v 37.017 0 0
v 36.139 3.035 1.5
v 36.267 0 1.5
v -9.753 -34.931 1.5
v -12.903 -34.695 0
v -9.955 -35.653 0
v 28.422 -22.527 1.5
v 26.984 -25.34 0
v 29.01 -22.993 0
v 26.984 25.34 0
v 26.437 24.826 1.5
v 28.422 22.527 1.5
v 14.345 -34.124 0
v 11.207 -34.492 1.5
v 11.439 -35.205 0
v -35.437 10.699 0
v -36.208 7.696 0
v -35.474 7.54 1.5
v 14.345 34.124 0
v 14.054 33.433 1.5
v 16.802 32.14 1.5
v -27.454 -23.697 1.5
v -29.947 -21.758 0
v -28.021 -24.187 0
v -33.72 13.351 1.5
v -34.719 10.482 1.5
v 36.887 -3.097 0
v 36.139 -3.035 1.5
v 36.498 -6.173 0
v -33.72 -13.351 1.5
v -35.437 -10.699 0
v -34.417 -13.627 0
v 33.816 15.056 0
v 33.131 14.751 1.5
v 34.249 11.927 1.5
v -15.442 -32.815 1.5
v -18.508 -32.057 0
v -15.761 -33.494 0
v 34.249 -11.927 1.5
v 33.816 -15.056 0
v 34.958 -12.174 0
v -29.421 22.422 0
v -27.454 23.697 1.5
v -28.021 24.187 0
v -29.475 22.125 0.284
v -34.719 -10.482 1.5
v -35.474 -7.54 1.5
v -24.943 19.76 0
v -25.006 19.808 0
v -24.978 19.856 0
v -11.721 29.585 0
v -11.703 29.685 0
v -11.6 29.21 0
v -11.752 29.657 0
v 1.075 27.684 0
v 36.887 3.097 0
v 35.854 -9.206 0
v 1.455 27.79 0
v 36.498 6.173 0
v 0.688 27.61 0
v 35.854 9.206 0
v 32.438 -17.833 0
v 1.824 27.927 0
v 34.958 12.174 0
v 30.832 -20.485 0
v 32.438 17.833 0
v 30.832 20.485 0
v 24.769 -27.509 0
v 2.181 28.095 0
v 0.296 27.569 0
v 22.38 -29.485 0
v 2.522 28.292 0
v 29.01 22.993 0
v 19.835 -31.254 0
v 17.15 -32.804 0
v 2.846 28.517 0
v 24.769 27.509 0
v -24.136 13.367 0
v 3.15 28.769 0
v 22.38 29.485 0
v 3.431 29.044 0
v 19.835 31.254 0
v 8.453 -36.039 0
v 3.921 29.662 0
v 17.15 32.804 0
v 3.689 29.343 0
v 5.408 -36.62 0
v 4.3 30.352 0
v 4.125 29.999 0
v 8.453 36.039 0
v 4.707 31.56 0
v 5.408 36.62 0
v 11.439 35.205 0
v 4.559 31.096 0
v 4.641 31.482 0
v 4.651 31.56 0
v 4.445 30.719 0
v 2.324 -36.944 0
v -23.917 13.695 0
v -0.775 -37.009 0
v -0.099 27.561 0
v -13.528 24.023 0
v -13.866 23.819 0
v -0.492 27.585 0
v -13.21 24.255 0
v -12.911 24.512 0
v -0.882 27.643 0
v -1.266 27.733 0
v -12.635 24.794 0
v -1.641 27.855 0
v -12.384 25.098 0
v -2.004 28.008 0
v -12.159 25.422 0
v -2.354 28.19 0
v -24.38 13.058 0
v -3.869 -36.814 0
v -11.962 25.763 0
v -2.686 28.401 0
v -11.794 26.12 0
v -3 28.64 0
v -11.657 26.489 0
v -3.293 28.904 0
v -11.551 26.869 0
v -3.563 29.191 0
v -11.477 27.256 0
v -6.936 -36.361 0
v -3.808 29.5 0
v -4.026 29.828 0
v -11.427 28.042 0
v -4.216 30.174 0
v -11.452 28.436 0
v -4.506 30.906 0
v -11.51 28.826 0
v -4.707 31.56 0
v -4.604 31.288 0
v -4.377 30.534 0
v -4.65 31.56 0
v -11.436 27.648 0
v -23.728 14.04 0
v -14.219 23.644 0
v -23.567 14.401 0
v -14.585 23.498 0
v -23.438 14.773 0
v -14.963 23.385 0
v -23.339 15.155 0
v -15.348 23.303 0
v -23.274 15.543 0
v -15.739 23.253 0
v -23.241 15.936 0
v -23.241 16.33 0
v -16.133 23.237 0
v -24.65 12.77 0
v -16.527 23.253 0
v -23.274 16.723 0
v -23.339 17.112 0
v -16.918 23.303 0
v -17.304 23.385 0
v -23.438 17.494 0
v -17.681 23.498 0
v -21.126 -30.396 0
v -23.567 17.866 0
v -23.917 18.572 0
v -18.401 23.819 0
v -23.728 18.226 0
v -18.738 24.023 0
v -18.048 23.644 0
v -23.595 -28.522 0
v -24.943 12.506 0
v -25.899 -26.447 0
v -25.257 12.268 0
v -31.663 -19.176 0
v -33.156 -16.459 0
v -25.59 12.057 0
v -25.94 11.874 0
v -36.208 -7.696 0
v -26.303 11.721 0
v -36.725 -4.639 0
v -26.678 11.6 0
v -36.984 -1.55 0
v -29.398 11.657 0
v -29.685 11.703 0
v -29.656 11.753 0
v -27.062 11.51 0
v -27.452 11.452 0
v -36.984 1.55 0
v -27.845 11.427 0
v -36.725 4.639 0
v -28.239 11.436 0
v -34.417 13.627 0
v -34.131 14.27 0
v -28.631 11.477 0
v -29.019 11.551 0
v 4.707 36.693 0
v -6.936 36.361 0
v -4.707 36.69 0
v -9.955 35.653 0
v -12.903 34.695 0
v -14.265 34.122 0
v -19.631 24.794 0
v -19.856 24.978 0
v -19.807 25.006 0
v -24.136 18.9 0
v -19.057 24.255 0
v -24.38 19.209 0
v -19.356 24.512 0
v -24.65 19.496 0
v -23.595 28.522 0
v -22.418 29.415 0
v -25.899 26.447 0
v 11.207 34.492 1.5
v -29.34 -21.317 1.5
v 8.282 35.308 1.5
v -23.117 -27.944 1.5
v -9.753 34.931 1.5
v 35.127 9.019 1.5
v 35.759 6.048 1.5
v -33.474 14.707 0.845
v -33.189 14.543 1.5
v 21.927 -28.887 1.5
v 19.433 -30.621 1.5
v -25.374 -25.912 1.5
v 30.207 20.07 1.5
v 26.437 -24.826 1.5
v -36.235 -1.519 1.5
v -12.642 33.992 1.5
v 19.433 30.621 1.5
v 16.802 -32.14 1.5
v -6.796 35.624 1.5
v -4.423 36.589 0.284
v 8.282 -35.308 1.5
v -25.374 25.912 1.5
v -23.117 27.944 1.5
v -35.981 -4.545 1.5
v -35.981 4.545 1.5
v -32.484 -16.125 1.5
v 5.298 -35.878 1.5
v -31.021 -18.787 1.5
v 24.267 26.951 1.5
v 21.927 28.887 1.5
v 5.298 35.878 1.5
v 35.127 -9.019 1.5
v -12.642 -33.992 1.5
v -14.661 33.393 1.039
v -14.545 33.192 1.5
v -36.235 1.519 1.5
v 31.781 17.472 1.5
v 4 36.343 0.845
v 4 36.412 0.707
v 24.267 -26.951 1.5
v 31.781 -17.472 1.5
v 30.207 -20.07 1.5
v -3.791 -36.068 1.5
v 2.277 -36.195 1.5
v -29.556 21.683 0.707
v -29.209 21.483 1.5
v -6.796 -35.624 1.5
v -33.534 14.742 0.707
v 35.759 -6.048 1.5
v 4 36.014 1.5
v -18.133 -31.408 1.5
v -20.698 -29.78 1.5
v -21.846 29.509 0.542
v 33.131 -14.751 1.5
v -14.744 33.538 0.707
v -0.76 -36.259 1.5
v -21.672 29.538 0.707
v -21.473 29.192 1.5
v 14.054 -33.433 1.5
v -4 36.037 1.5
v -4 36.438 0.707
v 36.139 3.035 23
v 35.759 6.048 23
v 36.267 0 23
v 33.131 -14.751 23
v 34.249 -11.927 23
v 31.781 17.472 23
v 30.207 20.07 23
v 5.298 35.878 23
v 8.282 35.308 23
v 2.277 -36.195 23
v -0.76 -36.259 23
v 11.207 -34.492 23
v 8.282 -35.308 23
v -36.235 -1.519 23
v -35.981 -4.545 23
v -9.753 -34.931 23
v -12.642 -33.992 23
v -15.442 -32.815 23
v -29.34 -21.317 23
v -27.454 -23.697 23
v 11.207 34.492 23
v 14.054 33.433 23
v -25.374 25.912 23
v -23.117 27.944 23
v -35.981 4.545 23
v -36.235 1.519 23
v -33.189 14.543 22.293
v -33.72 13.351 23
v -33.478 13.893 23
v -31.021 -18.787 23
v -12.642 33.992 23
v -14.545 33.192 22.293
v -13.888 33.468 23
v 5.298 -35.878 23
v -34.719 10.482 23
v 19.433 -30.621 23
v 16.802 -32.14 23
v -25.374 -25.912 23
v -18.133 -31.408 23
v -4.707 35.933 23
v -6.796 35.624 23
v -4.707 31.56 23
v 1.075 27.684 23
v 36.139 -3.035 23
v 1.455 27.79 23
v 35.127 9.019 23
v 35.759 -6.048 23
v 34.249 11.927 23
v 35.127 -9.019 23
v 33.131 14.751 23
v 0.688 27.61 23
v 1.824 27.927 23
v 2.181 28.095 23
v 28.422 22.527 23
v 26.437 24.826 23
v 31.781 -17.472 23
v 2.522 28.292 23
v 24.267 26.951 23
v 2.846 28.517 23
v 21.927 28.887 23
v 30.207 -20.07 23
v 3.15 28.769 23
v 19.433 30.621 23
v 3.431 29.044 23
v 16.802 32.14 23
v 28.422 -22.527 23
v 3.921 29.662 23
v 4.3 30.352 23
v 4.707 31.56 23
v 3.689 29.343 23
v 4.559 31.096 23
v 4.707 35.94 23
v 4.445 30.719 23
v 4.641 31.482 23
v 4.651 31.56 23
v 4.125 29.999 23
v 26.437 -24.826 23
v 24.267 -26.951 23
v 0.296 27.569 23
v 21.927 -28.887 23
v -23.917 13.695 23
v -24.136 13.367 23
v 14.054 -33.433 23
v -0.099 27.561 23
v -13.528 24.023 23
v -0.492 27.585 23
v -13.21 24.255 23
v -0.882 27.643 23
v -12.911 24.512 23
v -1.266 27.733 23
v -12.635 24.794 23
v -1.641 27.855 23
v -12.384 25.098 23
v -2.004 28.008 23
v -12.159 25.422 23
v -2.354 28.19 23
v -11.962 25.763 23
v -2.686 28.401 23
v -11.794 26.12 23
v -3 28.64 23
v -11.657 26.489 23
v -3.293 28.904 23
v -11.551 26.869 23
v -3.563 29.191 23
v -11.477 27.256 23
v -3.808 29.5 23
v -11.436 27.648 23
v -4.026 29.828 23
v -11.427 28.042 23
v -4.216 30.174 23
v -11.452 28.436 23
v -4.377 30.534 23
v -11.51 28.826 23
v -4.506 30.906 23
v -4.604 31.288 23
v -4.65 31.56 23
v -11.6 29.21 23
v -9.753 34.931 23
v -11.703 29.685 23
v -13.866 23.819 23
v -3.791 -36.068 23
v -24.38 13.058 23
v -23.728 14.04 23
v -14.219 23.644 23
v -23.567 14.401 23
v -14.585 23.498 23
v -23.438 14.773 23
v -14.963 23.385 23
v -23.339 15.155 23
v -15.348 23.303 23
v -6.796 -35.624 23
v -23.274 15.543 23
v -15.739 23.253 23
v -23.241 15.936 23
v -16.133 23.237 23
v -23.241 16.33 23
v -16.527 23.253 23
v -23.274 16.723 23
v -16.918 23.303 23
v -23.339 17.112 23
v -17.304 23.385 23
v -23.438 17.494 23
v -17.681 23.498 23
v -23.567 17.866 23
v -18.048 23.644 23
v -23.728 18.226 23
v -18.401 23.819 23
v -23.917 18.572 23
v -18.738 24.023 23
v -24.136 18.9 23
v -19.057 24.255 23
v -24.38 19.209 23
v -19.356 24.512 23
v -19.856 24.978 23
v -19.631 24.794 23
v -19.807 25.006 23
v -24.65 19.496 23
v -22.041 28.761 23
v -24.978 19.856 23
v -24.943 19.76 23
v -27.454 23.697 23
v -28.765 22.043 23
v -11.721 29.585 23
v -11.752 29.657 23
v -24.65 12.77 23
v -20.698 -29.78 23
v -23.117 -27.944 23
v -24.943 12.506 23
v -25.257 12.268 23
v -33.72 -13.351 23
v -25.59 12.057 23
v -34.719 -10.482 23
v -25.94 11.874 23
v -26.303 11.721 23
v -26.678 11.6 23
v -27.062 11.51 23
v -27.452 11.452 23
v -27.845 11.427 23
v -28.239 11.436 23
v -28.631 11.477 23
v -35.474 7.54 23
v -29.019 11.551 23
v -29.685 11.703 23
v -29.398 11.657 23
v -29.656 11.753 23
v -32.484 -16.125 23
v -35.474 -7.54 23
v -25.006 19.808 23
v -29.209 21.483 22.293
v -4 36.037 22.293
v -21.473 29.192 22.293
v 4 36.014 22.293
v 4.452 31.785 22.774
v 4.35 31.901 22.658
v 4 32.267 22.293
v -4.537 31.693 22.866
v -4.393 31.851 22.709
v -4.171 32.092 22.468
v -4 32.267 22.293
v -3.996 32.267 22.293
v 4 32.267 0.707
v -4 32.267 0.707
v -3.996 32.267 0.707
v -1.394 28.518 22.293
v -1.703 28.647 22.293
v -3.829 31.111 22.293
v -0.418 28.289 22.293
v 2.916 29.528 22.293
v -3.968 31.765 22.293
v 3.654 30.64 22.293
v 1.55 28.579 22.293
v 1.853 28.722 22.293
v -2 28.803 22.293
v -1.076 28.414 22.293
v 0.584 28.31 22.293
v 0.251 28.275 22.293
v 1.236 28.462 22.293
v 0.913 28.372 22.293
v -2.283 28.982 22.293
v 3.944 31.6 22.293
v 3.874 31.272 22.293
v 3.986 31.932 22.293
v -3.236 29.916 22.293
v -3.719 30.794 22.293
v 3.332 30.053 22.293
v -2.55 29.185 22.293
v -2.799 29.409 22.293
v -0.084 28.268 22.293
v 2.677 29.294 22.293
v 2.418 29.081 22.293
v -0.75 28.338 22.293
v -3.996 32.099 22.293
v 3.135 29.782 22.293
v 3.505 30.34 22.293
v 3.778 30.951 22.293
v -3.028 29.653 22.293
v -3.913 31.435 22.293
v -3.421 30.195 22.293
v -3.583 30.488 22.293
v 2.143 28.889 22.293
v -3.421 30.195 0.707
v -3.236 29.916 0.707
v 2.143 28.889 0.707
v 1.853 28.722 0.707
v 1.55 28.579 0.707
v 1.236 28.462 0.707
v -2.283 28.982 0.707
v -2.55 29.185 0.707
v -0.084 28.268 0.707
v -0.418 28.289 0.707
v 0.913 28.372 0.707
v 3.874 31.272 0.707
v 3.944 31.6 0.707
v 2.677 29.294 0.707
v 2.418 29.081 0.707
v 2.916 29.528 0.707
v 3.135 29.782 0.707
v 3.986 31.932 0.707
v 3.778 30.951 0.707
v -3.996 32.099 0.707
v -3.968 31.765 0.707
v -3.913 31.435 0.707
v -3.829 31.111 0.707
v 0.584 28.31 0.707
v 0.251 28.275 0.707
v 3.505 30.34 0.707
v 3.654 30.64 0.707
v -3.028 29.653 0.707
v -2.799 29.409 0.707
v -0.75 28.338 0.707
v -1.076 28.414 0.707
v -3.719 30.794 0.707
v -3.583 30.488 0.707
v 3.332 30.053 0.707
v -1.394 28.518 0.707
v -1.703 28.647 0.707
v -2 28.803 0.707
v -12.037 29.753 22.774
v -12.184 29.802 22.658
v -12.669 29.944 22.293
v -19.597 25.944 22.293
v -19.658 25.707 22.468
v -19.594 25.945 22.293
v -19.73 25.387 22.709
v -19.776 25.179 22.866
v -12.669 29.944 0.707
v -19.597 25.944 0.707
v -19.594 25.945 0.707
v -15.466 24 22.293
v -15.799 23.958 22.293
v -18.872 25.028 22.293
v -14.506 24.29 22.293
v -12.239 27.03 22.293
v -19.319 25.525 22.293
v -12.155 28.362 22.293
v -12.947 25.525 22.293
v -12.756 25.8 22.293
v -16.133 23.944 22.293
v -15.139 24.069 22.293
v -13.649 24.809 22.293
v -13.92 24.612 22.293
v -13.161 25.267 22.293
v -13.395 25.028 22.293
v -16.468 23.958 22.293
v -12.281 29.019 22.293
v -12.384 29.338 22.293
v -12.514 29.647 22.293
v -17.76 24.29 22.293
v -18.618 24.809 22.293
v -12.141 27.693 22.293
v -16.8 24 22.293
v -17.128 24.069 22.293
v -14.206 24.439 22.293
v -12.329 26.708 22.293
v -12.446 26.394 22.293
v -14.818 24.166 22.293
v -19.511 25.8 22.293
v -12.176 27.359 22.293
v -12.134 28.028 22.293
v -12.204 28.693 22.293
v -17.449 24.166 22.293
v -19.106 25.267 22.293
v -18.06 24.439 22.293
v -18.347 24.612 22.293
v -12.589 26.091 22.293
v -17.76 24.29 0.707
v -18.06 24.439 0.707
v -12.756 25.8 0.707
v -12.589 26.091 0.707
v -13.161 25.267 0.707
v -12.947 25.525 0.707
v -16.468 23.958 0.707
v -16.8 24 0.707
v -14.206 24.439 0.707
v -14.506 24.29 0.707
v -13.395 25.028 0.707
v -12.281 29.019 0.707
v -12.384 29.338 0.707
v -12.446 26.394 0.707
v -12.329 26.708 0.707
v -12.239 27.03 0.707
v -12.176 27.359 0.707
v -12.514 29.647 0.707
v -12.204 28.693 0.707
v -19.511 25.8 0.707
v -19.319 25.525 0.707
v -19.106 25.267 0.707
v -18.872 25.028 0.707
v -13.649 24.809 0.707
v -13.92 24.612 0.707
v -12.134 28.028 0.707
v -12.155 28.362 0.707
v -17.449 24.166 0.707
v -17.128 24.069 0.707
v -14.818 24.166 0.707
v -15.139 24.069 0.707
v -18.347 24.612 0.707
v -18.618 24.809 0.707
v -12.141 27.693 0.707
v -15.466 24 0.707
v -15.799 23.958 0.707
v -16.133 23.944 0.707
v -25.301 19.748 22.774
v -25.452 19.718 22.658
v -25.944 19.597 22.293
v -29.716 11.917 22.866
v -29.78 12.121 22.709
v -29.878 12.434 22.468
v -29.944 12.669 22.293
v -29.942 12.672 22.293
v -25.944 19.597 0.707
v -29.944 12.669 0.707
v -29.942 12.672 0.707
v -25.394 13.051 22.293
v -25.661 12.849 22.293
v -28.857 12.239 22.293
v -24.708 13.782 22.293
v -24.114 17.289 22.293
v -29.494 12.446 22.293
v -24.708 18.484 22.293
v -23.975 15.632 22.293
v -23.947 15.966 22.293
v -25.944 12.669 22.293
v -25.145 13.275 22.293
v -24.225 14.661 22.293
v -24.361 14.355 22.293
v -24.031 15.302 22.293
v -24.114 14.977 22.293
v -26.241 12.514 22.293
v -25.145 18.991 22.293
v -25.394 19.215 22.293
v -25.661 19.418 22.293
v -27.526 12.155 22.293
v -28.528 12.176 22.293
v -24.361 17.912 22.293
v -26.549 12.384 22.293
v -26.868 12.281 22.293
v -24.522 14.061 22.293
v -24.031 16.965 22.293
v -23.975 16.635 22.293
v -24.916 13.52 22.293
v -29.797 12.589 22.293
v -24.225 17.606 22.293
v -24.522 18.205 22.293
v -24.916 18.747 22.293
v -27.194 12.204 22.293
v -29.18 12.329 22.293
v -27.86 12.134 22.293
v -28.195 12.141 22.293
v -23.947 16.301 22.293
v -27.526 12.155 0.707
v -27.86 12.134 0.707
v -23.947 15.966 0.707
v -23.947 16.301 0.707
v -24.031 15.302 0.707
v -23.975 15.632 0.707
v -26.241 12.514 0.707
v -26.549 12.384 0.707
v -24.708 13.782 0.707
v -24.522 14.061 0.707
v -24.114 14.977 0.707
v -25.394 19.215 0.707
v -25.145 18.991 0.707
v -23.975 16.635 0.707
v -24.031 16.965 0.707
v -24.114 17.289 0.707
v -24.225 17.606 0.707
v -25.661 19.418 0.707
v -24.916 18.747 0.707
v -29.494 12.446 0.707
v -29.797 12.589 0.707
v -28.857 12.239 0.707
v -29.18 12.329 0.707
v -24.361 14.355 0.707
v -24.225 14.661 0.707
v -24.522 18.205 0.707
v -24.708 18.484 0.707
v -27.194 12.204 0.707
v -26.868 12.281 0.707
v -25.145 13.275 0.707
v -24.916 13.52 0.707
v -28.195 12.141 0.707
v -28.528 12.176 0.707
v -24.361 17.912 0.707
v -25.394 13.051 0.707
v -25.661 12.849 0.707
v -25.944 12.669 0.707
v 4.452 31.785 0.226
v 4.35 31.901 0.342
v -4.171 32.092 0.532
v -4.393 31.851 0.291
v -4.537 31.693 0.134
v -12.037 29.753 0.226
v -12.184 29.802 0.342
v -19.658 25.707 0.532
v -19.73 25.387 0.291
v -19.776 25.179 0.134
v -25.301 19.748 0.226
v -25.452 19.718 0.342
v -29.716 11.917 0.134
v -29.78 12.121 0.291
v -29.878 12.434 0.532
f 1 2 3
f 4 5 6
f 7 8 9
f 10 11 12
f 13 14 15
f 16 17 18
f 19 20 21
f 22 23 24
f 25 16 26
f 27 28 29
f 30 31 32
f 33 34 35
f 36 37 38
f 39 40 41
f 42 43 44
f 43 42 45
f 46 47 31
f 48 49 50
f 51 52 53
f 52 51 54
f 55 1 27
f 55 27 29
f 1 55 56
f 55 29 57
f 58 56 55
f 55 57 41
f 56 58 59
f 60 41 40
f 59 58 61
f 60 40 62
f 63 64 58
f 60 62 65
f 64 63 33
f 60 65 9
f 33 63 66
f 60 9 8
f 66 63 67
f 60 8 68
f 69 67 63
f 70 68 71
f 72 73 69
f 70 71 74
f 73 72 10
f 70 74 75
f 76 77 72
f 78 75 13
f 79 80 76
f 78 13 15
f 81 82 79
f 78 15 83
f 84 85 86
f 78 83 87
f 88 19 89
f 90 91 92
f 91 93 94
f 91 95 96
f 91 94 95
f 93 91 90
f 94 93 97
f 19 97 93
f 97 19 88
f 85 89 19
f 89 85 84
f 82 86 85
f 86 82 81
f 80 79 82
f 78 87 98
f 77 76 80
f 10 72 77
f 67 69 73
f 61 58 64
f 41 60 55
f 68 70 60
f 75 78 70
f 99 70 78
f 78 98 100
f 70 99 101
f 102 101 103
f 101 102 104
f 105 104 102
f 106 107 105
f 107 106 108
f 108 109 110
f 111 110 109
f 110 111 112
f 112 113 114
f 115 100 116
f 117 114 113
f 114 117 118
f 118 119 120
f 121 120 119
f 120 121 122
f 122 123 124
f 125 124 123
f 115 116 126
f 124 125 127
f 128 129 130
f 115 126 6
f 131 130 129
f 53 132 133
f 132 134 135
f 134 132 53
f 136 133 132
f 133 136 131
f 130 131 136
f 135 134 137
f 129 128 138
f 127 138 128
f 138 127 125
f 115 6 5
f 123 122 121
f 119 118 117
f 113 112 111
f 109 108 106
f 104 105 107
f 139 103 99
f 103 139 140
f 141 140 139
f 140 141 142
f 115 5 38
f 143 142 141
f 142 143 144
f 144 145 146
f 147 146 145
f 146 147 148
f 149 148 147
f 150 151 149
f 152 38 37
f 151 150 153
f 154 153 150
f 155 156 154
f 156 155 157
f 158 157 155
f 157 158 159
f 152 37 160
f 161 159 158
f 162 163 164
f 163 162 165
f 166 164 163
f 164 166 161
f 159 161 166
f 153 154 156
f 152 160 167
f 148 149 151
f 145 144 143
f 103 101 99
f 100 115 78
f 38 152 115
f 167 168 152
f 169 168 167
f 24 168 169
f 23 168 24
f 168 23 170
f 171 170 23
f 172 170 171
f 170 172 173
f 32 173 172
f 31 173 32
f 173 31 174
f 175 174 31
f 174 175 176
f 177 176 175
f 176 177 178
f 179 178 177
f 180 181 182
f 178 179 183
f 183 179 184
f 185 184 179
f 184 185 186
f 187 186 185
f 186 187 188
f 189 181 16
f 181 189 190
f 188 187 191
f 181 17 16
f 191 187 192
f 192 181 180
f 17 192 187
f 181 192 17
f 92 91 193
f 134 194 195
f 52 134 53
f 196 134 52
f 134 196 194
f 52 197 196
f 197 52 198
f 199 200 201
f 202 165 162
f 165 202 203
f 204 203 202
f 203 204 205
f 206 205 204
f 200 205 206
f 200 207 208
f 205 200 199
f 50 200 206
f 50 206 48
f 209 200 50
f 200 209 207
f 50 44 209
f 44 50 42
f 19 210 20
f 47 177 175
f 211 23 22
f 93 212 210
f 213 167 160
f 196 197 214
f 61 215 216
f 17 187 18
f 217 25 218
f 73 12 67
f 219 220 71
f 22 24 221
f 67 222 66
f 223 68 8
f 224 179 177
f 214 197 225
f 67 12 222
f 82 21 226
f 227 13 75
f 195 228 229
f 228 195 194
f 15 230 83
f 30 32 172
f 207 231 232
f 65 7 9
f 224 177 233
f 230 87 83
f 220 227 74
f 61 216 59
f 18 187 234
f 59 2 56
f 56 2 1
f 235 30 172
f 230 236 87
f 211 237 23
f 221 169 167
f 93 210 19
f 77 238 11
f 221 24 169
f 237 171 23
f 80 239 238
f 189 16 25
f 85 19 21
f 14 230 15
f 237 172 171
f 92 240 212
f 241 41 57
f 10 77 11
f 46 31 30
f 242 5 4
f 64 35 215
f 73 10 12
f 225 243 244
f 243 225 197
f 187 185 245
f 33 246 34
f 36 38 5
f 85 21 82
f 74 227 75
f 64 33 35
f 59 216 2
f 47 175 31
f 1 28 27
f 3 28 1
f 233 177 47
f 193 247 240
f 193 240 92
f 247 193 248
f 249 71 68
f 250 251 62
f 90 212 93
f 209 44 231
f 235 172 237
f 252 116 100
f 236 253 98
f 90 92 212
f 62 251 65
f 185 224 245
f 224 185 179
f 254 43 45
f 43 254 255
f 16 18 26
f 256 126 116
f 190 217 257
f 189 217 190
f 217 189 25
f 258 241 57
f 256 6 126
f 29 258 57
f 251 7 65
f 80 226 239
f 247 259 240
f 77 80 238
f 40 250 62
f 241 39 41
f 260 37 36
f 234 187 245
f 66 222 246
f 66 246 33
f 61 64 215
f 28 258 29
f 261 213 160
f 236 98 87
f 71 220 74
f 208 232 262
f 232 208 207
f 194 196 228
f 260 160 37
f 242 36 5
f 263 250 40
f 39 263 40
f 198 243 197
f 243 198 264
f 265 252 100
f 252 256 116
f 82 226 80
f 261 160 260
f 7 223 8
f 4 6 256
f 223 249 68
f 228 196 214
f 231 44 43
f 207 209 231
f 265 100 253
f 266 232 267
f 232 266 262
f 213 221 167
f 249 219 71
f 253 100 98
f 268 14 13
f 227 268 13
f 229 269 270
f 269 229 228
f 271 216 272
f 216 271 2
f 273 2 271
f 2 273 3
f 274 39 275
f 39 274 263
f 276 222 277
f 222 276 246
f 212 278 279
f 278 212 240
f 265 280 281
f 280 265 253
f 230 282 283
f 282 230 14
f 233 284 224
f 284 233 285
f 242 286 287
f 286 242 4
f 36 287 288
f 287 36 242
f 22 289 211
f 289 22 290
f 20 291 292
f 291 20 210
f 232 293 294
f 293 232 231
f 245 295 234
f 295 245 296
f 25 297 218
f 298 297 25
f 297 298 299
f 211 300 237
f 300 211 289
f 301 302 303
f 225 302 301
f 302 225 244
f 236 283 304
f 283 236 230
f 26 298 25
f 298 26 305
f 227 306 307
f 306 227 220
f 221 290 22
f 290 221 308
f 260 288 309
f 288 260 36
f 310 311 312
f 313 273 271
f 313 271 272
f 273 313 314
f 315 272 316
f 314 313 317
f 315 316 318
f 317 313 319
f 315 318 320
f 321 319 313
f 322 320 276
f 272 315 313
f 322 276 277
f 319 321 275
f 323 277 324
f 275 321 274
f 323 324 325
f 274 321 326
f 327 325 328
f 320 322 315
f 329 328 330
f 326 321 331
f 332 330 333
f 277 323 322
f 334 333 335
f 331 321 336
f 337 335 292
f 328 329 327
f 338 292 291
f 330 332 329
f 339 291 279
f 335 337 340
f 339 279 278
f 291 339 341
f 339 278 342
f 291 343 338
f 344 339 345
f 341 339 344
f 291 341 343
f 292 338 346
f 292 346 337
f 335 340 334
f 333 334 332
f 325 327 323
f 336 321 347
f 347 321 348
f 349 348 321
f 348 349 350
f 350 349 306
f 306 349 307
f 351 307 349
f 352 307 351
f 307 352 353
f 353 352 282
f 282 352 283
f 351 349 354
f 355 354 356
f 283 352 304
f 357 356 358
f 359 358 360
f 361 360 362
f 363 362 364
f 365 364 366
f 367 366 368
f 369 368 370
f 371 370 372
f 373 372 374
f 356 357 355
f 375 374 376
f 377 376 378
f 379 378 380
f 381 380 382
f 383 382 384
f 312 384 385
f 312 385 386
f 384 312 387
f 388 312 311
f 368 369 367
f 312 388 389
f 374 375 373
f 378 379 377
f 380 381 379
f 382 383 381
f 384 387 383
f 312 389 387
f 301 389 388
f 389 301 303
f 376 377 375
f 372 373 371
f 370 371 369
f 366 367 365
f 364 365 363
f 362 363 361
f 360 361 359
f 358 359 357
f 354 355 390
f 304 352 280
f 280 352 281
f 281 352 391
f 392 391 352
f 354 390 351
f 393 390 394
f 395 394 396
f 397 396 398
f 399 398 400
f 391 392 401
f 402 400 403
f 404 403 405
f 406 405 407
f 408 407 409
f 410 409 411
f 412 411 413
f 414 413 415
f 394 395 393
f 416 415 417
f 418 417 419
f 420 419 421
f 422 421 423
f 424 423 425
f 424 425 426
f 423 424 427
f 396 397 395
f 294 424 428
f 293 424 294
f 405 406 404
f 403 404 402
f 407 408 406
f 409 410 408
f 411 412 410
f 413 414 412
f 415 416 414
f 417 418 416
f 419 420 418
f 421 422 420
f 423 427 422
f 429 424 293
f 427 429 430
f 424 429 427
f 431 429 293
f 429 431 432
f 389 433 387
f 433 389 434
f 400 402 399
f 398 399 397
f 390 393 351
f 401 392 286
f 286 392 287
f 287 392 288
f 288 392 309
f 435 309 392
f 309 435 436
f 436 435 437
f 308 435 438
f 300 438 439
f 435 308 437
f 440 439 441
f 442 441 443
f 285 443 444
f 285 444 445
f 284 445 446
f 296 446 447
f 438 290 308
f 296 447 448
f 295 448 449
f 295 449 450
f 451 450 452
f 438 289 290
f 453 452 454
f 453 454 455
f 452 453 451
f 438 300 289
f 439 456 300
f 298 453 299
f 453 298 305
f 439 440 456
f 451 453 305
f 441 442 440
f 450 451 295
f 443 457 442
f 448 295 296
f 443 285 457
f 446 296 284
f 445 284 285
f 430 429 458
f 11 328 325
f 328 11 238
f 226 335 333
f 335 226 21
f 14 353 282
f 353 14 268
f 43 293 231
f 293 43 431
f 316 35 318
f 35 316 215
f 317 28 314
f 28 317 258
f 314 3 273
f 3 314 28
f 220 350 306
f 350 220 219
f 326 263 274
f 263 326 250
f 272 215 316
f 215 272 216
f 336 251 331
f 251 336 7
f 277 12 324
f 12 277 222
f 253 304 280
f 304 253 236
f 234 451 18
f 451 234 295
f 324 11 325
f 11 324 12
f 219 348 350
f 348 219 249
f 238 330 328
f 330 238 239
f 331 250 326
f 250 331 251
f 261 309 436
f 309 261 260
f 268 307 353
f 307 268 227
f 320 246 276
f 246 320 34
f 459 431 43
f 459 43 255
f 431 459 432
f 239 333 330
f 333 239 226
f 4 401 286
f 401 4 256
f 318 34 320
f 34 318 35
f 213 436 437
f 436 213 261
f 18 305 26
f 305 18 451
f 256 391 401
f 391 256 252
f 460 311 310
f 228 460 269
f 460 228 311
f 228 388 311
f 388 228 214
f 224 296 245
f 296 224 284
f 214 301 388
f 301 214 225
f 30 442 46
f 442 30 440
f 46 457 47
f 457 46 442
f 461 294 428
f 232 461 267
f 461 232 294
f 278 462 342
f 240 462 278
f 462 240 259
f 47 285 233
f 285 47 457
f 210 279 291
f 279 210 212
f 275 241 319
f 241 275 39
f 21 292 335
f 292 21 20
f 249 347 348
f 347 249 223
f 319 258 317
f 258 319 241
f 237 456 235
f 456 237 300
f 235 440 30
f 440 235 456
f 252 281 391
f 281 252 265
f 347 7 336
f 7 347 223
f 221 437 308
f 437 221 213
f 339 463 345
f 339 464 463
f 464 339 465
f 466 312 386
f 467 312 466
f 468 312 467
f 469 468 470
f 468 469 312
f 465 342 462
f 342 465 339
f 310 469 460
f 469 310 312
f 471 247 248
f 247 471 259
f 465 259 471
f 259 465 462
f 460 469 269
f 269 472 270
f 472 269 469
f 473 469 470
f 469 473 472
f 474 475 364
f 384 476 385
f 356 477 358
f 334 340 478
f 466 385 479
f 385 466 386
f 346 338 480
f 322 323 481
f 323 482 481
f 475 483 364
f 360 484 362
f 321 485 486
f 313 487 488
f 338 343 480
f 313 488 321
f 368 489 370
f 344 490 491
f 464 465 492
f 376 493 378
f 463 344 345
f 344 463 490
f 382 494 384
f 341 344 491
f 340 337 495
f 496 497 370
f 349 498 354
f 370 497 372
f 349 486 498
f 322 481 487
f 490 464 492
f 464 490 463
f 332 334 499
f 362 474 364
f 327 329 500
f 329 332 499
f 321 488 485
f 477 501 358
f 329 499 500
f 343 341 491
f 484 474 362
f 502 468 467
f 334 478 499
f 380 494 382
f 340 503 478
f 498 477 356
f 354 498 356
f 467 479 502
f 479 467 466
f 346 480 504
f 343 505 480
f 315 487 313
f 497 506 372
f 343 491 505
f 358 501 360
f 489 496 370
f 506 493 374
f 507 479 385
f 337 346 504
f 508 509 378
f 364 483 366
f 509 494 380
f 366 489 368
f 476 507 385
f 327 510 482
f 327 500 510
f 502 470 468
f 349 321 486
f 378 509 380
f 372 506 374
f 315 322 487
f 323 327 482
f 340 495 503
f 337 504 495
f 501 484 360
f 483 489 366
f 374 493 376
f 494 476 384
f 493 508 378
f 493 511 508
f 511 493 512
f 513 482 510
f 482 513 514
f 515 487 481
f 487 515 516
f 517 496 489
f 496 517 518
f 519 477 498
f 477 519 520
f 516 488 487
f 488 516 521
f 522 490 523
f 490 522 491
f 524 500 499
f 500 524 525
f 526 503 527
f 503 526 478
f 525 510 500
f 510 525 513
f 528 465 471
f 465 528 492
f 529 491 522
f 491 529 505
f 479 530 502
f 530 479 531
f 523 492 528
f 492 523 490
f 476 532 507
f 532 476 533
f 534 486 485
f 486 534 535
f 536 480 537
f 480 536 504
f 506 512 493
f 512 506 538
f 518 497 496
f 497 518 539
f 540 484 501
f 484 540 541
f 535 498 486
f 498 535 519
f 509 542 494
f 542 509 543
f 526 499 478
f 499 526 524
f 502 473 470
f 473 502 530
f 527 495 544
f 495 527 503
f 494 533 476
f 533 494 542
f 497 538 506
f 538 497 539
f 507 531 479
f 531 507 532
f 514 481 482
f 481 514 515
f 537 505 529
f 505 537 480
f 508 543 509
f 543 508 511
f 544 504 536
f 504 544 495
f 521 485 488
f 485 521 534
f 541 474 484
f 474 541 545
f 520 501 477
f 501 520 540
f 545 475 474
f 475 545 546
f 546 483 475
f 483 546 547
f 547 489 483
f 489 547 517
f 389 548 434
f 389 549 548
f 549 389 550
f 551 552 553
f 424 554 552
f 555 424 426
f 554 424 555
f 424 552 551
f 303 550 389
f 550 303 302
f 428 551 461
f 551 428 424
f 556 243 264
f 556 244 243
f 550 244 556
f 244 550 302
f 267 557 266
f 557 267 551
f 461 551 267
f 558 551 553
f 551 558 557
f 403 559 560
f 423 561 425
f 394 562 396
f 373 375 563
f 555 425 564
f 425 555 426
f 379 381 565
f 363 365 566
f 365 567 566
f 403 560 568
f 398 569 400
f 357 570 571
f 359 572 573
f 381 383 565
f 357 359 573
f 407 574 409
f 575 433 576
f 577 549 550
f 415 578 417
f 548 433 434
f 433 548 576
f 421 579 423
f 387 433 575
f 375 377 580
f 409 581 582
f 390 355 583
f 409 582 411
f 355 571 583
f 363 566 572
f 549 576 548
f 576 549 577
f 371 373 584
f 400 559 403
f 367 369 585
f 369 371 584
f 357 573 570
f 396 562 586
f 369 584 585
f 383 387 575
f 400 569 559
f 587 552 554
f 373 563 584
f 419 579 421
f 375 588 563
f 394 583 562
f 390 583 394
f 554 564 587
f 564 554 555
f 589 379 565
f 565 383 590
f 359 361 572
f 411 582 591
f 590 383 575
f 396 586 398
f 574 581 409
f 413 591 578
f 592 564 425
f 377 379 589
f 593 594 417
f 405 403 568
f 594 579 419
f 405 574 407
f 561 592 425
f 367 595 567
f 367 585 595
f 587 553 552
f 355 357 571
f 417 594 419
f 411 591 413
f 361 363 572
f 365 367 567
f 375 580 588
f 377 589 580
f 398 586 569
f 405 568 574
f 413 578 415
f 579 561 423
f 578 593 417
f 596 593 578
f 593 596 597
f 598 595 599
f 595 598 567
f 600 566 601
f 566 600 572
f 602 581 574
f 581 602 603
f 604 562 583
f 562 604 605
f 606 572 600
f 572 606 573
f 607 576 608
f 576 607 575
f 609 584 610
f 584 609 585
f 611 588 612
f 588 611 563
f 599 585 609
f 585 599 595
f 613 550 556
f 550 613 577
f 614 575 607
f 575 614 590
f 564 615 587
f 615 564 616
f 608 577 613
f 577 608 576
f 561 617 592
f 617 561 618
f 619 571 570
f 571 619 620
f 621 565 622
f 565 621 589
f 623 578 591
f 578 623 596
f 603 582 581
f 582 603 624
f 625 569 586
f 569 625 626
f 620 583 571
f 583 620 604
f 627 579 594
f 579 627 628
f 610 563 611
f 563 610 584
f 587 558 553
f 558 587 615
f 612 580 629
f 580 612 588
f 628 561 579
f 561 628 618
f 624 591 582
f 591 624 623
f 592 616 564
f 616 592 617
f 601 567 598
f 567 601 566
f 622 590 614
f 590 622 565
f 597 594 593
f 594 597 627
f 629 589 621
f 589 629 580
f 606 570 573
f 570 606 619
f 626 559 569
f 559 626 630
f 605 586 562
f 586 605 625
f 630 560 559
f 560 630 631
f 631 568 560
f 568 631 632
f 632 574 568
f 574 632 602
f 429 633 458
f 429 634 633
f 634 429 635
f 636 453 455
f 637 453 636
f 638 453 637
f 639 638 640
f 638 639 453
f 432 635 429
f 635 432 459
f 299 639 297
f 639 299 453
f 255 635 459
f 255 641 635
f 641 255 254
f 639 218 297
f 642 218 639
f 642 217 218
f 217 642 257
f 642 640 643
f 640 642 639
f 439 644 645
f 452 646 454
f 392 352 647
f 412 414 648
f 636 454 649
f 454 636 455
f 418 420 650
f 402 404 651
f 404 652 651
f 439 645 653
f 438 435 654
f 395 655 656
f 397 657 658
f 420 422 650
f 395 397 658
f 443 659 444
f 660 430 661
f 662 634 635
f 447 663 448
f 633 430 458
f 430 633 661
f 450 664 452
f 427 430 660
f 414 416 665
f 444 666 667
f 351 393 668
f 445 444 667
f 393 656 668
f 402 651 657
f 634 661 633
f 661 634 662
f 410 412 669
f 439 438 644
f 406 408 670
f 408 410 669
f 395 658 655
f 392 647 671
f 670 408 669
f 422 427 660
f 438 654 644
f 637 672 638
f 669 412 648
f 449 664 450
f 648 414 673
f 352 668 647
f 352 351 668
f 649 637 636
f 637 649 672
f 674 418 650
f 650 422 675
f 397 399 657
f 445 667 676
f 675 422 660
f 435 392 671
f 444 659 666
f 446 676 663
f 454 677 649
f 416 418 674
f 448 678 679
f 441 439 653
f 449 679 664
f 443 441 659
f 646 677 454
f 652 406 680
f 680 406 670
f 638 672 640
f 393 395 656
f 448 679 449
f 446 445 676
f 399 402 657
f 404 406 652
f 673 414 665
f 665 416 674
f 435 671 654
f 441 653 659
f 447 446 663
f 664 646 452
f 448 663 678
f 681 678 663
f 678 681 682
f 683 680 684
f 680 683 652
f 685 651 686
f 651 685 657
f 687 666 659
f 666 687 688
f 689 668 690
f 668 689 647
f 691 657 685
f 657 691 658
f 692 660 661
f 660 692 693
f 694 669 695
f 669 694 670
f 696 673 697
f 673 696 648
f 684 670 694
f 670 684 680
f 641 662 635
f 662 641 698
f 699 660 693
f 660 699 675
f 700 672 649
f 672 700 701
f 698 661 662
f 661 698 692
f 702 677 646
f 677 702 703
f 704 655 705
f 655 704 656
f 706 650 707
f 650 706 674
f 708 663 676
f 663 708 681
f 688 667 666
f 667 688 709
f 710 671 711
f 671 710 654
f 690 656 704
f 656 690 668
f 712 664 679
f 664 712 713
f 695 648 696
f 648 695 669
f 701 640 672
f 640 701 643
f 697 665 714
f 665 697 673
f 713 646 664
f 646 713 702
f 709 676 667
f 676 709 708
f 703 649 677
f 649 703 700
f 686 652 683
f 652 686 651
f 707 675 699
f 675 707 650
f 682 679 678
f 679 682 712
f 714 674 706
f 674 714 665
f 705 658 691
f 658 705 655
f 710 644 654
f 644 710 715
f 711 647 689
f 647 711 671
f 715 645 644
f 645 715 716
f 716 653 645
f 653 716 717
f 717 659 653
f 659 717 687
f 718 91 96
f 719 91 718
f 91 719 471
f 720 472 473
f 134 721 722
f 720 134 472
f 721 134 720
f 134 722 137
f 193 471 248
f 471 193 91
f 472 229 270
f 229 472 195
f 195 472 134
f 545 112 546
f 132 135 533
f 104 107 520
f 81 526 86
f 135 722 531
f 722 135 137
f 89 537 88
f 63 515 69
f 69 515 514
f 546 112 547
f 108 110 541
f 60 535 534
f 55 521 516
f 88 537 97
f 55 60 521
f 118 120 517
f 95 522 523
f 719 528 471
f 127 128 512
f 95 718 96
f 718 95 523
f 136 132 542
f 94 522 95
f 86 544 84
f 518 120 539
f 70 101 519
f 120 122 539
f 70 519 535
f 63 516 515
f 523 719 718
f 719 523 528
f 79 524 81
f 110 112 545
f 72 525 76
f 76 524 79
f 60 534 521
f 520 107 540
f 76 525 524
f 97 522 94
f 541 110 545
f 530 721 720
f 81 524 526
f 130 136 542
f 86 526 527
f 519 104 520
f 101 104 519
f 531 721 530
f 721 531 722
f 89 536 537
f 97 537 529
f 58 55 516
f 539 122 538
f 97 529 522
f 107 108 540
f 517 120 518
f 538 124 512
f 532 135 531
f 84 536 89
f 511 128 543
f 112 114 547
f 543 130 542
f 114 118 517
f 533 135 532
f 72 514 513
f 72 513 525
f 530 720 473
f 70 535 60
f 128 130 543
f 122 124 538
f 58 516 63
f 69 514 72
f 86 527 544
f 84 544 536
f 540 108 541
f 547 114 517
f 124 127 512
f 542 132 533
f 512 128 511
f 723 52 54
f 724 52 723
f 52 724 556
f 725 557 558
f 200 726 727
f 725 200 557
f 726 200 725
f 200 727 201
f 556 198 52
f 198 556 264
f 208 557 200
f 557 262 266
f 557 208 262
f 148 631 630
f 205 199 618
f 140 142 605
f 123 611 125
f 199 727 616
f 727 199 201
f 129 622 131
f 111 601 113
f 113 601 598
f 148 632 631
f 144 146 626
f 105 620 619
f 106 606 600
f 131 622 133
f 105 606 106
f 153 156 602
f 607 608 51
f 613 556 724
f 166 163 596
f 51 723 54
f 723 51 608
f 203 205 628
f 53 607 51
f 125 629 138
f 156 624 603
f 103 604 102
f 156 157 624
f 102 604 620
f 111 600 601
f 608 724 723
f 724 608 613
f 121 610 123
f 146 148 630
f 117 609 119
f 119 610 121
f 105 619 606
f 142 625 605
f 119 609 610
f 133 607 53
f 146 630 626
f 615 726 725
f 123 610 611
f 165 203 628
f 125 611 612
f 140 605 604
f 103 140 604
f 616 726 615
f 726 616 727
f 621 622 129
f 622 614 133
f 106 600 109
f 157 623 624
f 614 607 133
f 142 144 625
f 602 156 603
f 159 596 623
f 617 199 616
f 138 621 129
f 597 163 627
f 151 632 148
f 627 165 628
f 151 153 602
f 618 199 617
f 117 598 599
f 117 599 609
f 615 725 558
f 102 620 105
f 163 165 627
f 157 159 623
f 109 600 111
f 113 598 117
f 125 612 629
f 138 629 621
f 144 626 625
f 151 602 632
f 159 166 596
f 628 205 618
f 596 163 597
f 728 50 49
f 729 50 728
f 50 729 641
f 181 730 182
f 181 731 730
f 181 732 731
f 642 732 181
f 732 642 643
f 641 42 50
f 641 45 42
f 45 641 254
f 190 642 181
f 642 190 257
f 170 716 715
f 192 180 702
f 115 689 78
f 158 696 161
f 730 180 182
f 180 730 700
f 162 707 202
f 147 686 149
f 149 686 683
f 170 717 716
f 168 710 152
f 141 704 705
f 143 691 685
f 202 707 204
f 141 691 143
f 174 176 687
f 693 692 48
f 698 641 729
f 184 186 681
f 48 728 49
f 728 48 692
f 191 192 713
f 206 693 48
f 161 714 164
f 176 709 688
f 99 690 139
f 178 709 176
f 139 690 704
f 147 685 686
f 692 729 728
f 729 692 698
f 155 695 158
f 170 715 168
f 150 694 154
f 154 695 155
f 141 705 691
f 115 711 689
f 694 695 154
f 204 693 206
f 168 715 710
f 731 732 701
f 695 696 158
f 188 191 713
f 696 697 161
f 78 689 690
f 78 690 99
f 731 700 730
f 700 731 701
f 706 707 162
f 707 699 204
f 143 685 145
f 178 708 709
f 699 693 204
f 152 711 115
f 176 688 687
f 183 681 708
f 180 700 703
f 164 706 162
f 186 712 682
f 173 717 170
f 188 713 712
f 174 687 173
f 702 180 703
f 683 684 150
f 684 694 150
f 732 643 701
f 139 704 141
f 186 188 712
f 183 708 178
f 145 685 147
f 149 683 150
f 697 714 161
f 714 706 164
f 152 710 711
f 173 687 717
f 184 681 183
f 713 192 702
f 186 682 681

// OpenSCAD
// file: ../lib/lib_utils.scad
/**
* cut a model in half, removing the +x portion
*/
module half(bounds, active=true) {
  x=bounds[0] + (bounds[0]*0.1);
  y=bounds[1] + (bounds[1]*0.1);;
  z=bounds[2] + (bounds[2]*0.1);;
  
  if (active==true) {
    difference() {
      children();
      translate([0,-y/2,-(bounds[2]*0.1)/2])
        color("Crimson")
          cube([x/2,y,z]);
    }
  } else {
    children();
  }
}

module mirror_copy(v=[0,0,1], offset=[0,0,0]){
  children();
  mirror(v)translate(offset)children();
}

/**
* duplicate and rotate the children around the y axis
*/
module rotate_count(count, deg=0) {
  if (count == 1){
    children();
  } else if (count > 1){
    for (i=[1 : count-1]){
      children();
      if (deg>0){
        rotate([0,0,deg*i])
          children();
      } else {
        rotate([0,0,(360/count)*i])
          children();
      }
    }
  }
}

/**
* cut a hole in child objects along the Z axis
*/
module hole(d, r, draft=0, trans=[0,0,0], rot=[0,0,0]){
  difference(){
    children();
    translate(trans){
      rotate(rot)
      rotate([180,0,0]){
        if (draft>0) {
          opp_ang=90-draft;
          top_r=r+(d/sin(opp_ang)*sin(draft));
          cylinder(h=d, r1=top_r, r2=r);
        } else {
          cylinder(h=d, r=r);
        }
      }
    }
  }
  
}

/**
*
*/
module multiHull(){
    for (i = [1 : $children-1])
        hull(){
            children(0);
            children(i);
        }
}

/**
*
*/
module sequentialHull(){
    for (i = [0: $children-2])
        hull(){
            children(i);
            children(i+1);
        }
}

module innerRectFillet(s=[2,2], w=1, profile="flat"){
  w=w/sqrt(2);
  if(profile=="flat"){
    translate([-w,-w,0])
      cube([s[0]+w*2, s[1]+w*2, w*0.1]);
    CubePoints = [
      [     -w,      -w,   0 ],  //0
      [ s[0]+w,      -w,   0 ],  //1
      [ s[0]+w,  s[1]+w,   0 ],  //2
      [     -w,  s[1]+w,   0 ],  //3
      [      0,       0,  -w ],  //4
      [   s[0],       0,  -w ],  //5
      [   s[0],    s[1],  -w ],  //6
      [      0,    s[1],  -w ]]; //7
      
    CubeFaces = [
      [0,1,2,3],  // bottom
      [4,5,1,0],  // front
      [7,6,5,4],  // top
      [5,6,2,1],  // right
      [6,7,3,2],  // back
      [7,4,0,3]]; // left
      
    polyhedron( CubePoints, CubeFaces );
  }
  else if(profile=="round"){
    f_fn=$fn/4;
    translate([-w,-w,-w]){
      difference(){
        cube([s[0]+w*2, s[1]+w*2, w+w*0.1]);
        union(){
          mirror_copy(offset=[0,s[1]+w*2, 0])
            rotate([0,90,0])
              cylinder(h=s[0]+w*2, r=w, $fn=f_fn);
          mirror_copy(offset=[s[0]+w*2,0,0])
            rotate([0,90,90])
              cylinder(h=s[1]+w*2, r=w, $fn=f_fn);
          
        }
      }
    }
  } else{
    assert(false, "profile must be one of [\"flat\", \"round\"]");
  }
}


module innerCircFillet(r=2, w=1, profile="flat", $fn=$fn){
  w=w/sqrt(2);
  if(profile=="flat"){
    cylinder(h=w*0.1, r=r+w);
    translate([0,0,-w])
      cylinder(h=w, r1=r, r2=r+w);
  }
  else if(profile=="round"){
    points=[[-w,r], [-w,0], [0,0], [w*0.1, 0], [w*0.1, r+w], [0,r+w]];
    arc = [ for (a = [0 : 9 : 90]) w * [ sin(a), -cos(a)] ];
    moved = [ for (i = arc) i+[-w, r+w]];
    
    rotate_extrude()
      rotate([0,0,90])
        polygon(concat(points, moved), convexity=5);
    
  } else{
    assert(false, "profile must be one of [\"flat\", \"round\"]");
  }
}
// main file
include <../lib/lib_utils.scad>
///////////////////////////////////////////////////////////
// insert for desks with wire retention
//
///////////////////////////////////////////////////////////

$fn=75;
CUT_IN_HALF=true;

DESK_HOLE_RAD=39.5;  // in mm
DESK_TH=21;  // in mm

RIM_TH=3;  // in mm

BRIM_RAD=5;  // in mm
BRIM_TH=2;  // in mm
BRIM_EDGE_F=4;

INTERF=0.33;  // in mm

WIRE_RAD=4;  // in mm
WIRE_SEP=30;  // in deg
WIRE_FILLET=1;
WIRE_COUNT=3;


module angle_disc(h, r) {
  r2=r+h/4;
//  translate([0,0,-h/2])
//    cylinder(h=h/2, r1=r, r2=r2);
  translate([0,0,h/2])
    mirror([0,0,1])
      cylinder(h=h/2, r1=r, r2=r2);
}

module insert_ring() {
  innerRad=DESK_HOLE_RAD-RIM_TH;
  totalThickness=DESK_TH+BRIM_TH;
  difference(){
    hole(d=totalThickness+2, r=innerRad, trans=[0,0,totalThickness+1]) {
      color("CornflowerBlue"){
        cylinder(h=BRIM_TH-(BRIM_TH/BRIM_EDGE_F), r1=DESK_HOLE_RAD, r2=DESK_HOLE_RAD+BRIM_RAD);
        translate([0,0,BRIM_TH-(BRIM_TH/BRIM_EDGE_F)])
          cylinder(h=BRIM_TH/BRIM_EDGE_F, r=DESK_HOLE_RAD+BRIM_RAD);
      }
      
      draft_per=0.02;
      
      translate([0,0,BRIM_TH]){
        color("PowderBlue")
          cylinder(h=DESK_TH, r1=DESK_HOLE_RAD, r2=DESK_HOLE_RAD-(DESK_HOLE_RAD*draft_per));
        
        color("MediumBlue"){
          rotate_count(10){
            translate([0, DESK_HOLE_RAD-(DESK_HOLE_RAD*draft_per/1.25), 0])
              cylinder(h=DESK_TH-(DESK_TH*0.25), r1=1, r2=0.35);
          }
        }
      }
  }
    angle_disc(RIM_TH, innerRad);
  }
}


module insert_plug() {
  spacing=INTERF/sqrt(2);
  totalThickness=DESK_TH+BRIM_TH;
  radius=DESK_HOLE_RAD-RIM_TH-spacing;
  
  difference(){
    color("LawnGreen"){
      union(){
          angle_disc(RIM_TH, radius);
        
        cylinder(h=totalThickness, r=radius);
      }
    }
    
    color("Red"){
      slotWidth=WIRE_RAD*2;
      translate([0,0,totalThickness/2])
        mirror_copy([0,0,1])
          rotate_count(WIRE_COUNT, WIRE_SEP){
            translate([0,radius-WIRE_RAD,0]){
              translate([-WIRE_RAD,0,0]){
                cube([WIRE_RAD*2,WIRE_RAD*2,totalThickness/2]);
                translate([0,0,totalThickness/2])
                  innerRectFillet(s=[WIRE_RAD*2, WIRE_RAD*2],
                                  w=WIRE_FILLET,
                                  profile="flat");
            }
              
              cylinder(h=totalThickness/2, r=WIRE_RAD);
              translate([0,0,totalThickness/2])
                innerCircFillet(r=WIRE_RAD, w=WIRE_FILLET, profile="flat");
            }
          }
    }
    
  }
}

module make() {
  size=(DESK_HOLE_RAD+BRIM_RAD)*2;
  half([size,size,DESK_TH+BRIM_TH], CUT_IN_HALF){
    insert_ring();
    !insert_plug();
  }
}

make();
